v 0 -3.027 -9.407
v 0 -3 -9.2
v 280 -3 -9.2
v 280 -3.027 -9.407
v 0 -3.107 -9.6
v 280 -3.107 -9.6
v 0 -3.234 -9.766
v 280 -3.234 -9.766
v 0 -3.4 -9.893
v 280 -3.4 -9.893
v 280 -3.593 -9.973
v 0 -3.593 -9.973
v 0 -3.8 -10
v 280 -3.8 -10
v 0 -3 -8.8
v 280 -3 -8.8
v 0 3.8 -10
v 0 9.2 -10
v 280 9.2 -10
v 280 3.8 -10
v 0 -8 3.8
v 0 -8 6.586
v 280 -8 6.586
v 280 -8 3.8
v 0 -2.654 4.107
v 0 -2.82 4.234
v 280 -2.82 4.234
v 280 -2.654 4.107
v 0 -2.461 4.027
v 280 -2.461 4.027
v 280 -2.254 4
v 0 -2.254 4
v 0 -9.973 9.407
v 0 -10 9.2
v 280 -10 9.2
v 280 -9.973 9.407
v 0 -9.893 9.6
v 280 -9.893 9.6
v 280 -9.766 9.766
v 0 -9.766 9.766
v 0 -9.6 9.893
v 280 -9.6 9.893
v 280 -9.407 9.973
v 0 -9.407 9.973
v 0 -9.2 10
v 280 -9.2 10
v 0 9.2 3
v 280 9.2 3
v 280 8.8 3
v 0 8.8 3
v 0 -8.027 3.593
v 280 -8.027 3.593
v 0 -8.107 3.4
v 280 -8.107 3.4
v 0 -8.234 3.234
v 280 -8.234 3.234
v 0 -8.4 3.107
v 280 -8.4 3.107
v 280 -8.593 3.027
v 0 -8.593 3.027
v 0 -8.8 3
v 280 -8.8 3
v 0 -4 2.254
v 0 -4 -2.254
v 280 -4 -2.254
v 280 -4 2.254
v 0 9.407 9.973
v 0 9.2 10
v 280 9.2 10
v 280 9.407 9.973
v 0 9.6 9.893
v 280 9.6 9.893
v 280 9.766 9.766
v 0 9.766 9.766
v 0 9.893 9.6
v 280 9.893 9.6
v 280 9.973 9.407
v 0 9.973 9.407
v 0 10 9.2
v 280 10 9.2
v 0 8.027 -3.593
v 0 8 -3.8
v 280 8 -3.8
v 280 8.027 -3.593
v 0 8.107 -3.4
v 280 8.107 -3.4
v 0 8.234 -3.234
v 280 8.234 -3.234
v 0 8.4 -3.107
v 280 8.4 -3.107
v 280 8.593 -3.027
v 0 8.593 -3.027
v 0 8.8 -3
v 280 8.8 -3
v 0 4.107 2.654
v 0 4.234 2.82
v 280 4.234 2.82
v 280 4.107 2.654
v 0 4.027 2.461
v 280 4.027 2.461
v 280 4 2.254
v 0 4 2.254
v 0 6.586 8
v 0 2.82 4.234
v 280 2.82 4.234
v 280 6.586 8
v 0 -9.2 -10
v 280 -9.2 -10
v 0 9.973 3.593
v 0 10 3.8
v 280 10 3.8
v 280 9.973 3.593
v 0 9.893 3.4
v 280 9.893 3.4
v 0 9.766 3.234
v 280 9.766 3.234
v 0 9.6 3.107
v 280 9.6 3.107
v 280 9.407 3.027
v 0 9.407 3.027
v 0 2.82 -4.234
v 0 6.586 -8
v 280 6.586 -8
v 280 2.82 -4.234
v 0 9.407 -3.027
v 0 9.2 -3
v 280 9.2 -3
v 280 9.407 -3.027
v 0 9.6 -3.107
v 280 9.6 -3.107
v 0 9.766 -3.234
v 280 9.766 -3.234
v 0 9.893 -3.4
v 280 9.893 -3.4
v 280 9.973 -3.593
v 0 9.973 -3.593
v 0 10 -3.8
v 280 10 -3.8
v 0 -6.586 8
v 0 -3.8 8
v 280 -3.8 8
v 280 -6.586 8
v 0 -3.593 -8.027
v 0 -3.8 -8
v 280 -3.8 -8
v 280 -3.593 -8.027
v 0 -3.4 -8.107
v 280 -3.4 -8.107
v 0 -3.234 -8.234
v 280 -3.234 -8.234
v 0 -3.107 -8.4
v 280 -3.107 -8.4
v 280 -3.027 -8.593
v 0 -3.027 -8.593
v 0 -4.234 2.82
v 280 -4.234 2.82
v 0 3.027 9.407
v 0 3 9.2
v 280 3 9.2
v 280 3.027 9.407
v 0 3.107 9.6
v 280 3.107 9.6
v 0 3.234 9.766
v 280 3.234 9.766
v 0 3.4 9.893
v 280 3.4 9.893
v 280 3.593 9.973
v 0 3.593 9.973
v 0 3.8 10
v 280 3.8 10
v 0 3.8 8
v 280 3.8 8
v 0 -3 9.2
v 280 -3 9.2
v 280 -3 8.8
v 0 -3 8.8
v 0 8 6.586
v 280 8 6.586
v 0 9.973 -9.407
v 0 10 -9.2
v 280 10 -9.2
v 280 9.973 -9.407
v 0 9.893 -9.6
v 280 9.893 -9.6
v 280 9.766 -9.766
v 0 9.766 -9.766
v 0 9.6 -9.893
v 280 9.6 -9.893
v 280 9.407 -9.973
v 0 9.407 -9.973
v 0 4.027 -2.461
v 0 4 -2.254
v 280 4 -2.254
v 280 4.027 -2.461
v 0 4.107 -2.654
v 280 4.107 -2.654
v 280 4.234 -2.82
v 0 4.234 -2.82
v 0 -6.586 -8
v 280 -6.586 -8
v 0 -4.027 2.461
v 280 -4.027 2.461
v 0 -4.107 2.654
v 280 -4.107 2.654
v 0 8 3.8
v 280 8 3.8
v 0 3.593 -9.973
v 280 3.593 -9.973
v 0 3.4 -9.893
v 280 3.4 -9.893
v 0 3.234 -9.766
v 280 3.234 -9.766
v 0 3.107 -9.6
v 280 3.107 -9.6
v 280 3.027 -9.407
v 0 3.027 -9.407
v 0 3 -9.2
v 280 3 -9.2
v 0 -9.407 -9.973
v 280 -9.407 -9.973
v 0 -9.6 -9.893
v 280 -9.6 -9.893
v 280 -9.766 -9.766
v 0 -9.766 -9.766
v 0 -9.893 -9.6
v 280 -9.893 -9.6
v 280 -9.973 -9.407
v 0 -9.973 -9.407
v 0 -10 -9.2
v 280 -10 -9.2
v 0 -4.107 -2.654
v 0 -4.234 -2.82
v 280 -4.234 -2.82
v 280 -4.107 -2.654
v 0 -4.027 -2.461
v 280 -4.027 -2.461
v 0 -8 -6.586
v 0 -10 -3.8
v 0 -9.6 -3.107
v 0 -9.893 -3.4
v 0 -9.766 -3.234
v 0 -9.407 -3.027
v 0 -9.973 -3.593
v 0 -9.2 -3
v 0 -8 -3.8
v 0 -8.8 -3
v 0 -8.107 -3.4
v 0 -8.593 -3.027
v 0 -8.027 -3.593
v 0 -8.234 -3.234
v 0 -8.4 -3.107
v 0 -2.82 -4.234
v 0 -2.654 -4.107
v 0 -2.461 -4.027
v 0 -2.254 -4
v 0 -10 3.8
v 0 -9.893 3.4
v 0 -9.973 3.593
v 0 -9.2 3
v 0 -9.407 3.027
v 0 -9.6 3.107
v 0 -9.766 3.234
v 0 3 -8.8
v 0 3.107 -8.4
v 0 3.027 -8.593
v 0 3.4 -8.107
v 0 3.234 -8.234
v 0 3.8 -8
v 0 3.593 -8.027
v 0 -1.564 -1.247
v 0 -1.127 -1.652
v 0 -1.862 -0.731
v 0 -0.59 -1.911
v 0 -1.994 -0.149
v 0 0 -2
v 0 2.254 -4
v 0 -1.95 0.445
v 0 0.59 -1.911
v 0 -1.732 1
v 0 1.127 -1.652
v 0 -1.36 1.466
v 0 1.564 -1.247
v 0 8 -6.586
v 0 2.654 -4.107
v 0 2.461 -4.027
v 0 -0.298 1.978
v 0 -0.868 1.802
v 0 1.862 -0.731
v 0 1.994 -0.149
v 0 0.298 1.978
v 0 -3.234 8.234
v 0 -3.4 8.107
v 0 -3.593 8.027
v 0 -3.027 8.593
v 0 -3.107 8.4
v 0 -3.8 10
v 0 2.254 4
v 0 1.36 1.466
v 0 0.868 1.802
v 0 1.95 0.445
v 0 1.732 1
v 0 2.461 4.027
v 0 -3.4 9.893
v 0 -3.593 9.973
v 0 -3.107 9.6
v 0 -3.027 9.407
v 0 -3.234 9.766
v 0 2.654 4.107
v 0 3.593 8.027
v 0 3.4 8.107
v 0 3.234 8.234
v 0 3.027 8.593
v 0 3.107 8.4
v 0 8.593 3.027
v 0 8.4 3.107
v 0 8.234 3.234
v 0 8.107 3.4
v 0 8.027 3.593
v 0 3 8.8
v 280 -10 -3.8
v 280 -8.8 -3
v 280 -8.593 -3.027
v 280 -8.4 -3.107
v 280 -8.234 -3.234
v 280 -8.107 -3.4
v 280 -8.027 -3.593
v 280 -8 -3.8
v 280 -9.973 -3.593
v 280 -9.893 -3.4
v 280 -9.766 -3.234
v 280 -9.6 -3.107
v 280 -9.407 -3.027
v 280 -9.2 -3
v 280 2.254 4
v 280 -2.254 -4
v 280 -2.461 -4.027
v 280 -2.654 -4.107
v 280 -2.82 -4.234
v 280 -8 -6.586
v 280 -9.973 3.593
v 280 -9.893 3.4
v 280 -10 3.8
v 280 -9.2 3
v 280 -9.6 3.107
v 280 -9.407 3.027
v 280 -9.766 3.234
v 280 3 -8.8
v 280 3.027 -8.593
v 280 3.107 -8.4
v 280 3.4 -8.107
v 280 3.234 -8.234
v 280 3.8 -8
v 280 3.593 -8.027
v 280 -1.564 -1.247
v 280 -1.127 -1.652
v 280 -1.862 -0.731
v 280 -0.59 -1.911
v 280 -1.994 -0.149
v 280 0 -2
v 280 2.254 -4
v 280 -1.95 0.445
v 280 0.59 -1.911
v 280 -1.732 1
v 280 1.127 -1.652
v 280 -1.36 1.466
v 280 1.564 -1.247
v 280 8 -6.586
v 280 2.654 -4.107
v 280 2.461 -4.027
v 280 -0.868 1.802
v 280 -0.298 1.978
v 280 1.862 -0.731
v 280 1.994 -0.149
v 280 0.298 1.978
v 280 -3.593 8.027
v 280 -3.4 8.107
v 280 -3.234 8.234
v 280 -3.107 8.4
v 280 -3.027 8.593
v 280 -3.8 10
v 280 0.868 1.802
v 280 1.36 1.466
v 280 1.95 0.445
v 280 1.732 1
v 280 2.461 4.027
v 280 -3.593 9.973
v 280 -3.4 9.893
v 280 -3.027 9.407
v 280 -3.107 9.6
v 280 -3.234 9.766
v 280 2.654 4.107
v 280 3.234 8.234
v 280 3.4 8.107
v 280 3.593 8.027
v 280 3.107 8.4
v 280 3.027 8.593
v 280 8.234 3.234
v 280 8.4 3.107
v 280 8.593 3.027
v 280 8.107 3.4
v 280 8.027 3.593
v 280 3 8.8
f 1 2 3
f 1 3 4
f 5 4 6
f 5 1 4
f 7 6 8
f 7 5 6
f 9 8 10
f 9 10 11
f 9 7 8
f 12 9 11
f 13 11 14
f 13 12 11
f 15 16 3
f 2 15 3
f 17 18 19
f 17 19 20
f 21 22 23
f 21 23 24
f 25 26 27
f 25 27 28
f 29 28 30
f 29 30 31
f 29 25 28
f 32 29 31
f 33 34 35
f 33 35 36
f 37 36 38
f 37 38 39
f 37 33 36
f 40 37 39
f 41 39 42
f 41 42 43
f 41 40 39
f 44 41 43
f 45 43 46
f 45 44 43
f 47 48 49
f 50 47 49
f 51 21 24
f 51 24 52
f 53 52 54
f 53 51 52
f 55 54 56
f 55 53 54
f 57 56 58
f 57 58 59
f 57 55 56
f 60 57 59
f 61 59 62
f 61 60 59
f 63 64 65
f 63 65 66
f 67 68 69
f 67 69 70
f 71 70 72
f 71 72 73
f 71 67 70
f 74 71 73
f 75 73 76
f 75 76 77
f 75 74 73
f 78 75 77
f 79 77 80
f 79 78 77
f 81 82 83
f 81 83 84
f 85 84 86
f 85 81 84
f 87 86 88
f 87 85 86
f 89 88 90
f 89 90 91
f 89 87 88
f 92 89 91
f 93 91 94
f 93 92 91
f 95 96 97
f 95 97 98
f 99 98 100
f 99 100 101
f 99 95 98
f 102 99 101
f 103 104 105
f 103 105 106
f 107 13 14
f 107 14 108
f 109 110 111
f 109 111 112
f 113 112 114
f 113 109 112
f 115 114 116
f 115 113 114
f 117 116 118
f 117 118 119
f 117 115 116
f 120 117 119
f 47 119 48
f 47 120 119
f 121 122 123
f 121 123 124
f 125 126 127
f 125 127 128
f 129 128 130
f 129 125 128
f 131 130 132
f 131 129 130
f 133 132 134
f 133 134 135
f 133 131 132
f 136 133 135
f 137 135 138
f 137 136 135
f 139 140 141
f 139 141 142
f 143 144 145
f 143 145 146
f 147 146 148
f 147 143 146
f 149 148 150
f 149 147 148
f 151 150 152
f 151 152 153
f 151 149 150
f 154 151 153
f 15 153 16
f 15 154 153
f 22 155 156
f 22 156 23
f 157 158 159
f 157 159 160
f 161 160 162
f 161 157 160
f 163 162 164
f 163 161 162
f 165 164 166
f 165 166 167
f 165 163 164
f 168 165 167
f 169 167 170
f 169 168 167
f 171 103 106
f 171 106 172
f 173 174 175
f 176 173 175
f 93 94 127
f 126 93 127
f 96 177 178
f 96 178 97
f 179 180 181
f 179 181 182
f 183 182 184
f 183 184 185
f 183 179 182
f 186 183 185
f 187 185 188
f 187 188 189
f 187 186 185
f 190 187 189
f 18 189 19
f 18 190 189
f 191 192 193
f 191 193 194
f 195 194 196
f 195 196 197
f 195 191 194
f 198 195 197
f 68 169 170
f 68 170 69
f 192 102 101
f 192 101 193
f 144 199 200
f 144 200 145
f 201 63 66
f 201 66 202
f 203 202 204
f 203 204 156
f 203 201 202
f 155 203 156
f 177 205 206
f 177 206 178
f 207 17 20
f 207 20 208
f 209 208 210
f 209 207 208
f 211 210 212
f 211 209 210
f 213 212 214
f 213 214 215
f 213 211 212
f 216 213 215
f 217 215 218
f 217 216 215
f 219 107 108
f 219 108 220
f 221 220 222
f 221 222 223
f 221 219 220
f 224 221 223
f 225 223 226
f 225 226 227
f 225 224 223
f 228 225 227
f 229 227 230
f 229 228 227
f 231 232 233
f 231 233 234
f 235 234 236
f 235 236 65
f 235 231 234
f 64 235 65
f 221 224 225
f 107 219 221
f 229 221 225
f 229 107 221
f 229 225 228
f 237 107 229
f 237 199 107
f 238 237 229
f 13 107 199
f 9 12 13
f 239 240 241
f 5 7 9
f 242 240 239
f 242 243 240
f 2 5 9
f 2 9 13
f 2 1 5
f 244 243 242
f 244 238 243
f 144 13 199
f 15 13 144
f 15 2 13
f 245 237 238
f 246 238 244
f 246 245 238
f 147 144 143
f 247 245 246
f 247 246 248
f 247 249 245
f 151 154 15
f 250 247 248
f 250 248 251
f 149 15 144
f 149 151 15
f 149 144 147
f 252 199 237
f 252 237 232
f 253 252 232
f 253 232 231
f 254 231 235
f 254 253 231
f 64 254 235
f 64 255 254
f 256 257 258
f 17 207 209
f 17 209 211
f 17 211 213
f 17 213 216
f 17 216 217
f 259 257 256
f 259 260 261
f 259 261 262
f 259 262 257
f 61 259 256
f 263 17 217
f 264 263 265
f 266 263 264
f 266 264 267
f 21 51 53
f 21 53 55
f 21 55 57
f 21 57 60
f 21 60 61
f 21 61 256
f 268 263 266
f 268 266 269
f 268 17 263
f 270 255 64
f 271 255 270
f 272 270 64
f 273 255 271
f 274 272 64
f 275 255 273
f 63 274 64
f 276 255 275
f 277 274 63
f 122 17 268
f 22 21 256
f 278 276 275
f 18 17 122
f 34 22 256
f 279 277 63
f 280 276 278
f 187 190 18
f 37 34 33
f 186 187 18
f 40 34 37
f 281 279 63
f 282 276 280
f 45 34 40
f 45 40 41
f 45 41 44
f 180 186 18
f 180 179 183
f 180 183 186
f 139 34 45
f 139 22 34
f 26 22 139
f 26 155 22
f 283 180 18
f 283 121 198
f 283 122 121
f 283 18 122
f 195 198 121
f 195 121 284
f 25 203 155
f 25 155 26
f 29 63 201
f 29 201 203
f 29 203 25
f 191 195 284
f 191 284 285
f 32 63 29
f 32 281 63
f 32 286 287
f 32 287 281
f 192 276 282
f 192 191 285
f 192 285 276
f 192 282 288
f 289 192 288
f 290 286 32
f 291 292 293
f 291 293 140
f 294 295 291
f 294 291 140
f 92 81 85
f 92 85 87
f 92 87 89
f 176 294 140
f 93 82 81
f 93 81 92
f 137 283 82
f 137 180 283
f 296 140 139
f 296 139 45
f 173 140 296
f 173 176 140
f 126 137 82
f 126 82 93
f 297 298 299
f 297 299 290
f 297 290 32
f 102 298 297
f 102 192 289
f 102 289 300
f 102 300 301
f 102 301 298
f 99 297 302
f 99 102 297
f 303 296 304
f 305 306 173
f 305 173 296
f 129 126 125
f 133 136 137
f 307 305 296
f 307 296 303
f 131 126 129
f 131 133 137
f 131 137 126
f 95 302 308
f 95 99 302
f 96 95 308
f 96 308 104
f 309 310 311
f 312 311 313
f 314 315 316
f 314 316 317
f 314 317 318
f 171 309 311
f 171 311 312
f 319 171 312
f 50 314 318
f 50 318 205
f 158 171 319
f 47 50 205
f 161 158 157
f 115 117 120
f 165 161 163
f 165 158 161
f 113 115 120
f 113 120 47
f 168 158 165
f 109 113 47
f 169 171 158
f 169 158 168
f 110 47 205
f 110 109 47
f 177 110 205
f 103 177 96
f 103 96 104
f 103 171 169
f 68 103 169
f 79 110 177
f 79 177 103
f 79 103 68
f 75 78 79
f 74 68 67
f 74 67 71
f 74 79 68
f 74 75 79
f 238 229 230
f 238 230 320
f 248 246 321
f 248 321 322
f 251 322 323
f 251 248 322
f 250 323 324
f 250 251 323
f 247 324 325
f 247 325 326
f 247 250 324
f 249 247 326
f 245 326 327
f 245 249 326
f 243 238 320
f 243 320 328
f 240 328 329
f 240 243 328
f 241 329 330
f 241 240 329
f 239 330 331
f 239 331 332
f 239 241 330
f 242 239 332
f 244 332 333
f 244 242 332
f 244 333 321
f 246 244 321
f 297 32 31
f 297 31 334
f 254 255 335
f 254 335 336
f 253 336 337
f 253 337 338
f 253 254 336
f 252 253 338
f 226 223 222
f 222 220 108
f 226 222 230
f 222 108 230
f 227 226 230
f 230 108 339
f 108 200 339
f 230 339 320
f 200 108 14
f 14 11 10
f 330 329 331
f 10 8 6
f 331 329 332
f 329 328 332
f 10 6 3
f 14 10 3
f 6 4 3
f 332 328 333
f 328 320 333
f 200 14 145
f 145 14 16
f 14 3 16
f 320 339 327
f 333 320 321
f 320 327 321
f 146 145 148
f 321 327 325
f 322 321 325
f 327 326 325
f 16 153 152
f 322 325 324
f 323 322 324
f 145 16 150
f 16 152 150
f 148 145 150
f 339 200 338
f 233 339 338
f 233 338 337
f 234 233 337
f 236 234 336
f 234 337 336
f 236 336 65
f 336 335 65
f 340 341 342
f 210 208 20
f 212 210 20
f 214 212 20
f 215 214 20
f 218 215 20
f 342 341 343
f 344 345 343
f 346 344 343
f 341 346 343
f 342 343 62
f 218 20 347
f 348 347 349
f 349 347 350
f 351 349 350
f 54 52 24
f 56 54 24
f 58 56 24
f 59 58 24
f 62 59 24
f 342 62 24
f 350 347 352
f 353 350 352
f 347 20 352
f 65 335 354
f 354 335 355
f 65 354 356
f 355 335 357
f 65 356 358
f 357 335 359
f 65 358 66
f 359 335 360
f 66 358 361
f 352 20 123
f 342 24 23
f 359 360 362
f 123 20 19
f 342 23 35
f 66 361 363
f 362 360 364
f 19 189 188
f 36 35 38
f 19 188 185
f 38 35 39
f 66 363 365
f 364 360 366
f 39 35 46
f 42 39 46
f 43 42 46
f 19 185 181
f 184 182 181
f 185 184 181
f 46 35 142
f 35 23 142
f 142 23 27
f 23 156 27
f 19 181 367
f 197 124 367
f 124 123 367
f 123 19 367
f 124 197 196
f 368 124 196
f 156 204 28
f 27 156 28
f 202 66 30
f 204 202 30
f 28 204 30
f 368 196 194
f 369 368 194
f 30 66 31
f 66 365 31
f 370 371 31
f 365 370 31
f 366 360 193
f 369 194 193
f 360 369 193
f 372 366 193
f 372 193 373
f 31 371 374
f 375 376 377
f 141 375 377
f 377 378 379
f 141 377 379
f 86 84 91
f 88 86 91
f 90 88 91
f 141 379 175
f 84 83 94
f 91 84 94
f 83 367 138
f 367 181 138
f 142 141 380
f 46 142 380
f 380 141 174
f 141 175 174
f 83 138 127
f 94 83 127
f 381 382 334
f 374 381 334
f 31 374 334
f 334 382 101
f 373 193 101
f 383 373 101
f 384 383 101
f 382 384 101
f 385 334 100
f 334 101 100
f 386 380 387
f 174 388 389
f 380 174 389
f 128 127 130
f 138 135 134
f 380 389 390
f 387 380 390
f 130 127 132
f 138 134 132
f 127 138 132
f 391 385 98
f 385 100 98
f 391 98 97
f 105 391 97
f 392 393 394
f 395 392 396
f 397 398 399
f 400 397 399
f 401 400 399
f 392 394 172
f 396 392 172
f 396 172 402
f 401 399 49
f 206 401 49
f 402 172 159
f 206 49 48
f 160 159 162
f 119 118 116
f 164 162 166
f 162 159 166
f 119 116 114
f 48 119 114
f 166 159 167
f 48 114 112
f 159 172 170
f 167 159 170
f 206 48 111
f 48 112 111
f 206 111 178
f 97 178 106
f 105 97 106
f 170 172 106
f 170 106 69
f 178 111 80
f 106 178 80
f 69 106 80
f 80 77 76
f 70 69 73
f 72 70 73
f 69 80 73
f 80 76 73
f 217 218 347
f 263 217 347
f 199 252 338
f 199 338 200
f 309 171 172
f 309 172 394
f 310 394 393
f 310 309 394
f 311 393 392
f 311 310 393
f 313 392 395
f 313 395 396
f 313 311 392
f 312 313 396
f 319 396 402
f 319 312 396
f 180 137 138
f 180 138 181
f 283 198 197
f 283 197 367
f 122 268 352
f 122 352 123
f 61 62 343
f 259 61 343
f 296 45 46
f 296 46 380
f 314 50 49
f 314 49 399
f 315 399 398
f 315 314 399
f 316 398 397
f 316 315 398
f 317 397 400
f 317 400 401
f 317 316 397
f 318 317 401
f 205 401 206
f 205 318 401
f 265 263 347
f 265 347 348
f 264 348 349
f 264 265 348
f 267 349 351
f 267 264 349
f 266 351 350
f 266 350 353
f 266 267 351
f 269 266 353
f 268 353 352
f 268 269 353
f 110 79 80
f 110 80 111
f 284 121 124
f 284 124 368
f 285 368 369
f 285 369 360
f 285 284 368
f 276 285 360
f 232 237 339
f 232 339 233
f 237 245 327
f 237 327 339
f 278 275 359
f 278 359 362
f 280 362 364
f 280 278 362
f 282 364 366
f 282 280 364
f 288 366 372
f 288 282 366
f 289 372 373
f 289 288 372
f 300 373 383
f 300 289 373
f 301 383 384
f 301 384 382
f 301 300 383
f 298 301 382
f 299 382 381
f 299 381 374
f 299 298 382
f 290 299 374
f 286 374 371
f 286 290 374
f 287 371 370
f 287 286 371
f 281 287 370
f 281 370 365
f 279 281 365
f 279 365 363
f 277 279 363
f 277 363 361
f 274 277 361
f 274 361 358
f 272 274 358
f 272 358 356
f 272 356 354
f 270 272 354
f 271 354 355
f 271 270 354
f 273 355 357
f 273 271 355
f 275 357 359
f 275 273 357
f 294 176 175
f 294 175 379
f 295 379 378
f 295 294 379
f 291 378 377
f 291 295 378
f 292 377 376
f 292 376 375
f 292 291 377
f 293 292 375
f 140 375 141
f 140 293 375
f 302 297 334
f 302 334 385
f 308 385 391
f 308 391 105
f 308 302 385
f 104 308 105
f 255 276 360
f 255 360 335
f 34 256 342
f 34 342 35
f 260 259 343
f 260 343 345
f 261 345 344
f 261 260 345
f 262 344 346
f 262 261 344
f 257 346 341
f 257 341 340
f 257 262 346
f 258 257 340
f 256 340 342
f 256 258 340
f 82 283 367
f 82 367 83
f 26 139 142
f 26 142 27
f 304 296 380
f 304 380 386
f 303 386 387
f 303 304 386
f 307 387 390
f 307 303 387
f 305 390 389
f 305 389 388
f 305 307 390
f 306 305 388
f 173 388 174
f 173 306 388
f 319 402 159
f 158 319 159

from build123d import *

# Parameters (mm, degrees)
SKETCH11_R       = 2
SIZE_4X4_1_DEPTH = 280


with BuildPart() as part:
    # Sketch11 → Size 4X4 (1) (new body)
    with BuildSketch(Plane(origin=(0, 0, 0), x_dir=(0, 0, -1), z_dir=(1, 0, 0))):
        with BuildLine():
            Line((-3, 9.2), (-3, 8.8))
            ThreePointArc((-3, 8.8), (-3.234314575, 8.234314575), (-3.8, 8))
            Line((-3.8, 8), (-6.585786438, 8))
            Line((-6.585786438, 8), (-2.820101013, 4.234314575))
            ThreePointArc((-2.820101013, 4.234314575), (-2.560562334, 4.060896374), (-2.254415588, 4))
            Line((-2.254415588, 4), (2.254415588, 4))
            ThreePointArc((2.254415588, 4), (2.560562334, 4.060896374), (2.820101013, 4.234314575))
            Line((2.820101013, 4.234314575), (6.585786438, 8))
            Line((6.585786438, 8), (3.8, 8))
            ThreePointArc((3.8, 8), (3.234314575, 8.234314575), (3, 8.8))
            Line((3, 8.8), (3, 9.2))
            ThreePointArc((3, 9.2), (3.234314575, 9.765685425), (3.8, 10))
            Line((3.8, 10), (9.2, 10))
            ThreePointArc((9.2, 10), (9.765685425, 9.765685425), (10, 9.2))
            Line((10, 9.2), (10, 3.8))
            ThreePointArc((10, 3.8), (9.765685425, 3.234314575), (9.2, 3))
            Line((9.2, 3), (8.8, 3))
            ThreePointArc((8.8, 3), (8.234314575, 3.234314575), (8, 3.8))
            Line((8, 3.8), (8, 6.585786438))
            Line((8, 6.585786438), (4.234314575, 2.820101013))
            ThreePointArc((4.234314575, 2.820101013), (4.060896374, 2.560562334), (4, 2.254415588))
            Line((4, 2.254415588), (4, -2.254415588))
            ThreePointArc((4, -2.254415588), (4.060896374, -2.560562334), (4.234314575, -2.820101013))
            Line((4.234314575, -2.820101013), (8, -6.585786438))
            Line((8, -6.585786438), (8, -3.8))
            ThreePointArc((8, -3.8), (8.234314575, -3.234314575), (8.8, -3))
            Line((8.8, -3), (9.2, -3))
            ThreePointArc((9.2, -3), (9.765685425, -3.234314575), (10, -3.8))
            Line((10, -3.8), (10, -9.2))
            ThreePointArc((10, -9.2), (9.765685425, -9.765685425), (9.2, -10))
            Line((9.2, -10), (3.8, -10))
            ThreePointArc((3.8, -10), (3.234314575, -9.765685425), (3, -9.2))
            Line((3, -9.2), (3, -8.8))
            ThreePointArc((3, -8.8), (3.234314575, -8.234314575), (3.8, -8))
            Line((3.8, -8), (6.585786438, -8))
            Line((6.585786438, -8), (2.820101013, -4.234314575))
            ThreePointArc((2.820101013, -4.234314575), (2.560562334, -4.060896374), (2.254415588, -4))
            Line((2.254415588, -4), (-2.254415588, -4))
            ThreePointArc((-2.254415588, -4), (-2.560562334, -4.060896374), (-2.820101013, -4.234314575))
            Line((-2.820101013, -4.234314575), (-6.585786438, -8))
            Line((-6.585786438, -8), (-3.8, -8))
            ThreePointArc((-3.8, -8), (-3.234314575, -8.234314575), (-3, -8.8))
            Line((-3, -8.8), (-3, -9.2))
            ThreePointArc((-3, -9.2), (-3.234314575, -9.765685425), (-3.8, -10))
            Line((-3.8, -10), (-9.2, -10))
            ThreePointArc((-9.2, -10), (-9.765685425, -9.765685425), (-10, -9.2))
            Line((-10, -9.2), (-10, -3.8))
            ThreePointArc((-10, -3.8), (-9.765685425, -3.234314575), (-9.2, -3))
            Line((-9.2, -3), (-8.8, -3))
            ThreePointArc((-8.8, -3), (-8.234314575, -3.234314575), (-8, -3.8))
            Line((-8, -3.8), (-8, -6.585786438))
            Line((-8, -6.585786438), (-4.234314575, -2.820101013))
            ThreePointArc((-4.234314575, -2.820101013), (-4.060896374, -2.560562334), (-4, -2.254415588))
            Line((-4, -2.254415588), (-4, 2.254415588))
            ThreePointArc((-4, 2.254415588), (-4.060896374, 2.560562334), (-4.234314575, 2.820101013))
            Line((-4.234314575, 2.820101013), (-8, 6.585786438))
            Line((-8, 6.585786438), (-8, 3.8))
            ThreePointArc((-8, 3.8), (-8.234314575, 3.234314575), (-8.8, 3))
            Line((-8.8, 3), (-9.2, 3))
            ThreePointArc((-9.2, 3), (-9.765685425, 3.234314575), (-10, 3.8))
            Line((-10, 3.8), (-10, 9.2))
            ThreePointArc((-10, 9.2), (-9.765685425, 9.765685425), (-9.2, 10))
            Line((-9.2, 10), (-3.8, 10))
            ThreePointArc((-3.8, 10), (-3.234314575, 9.765685425), (-3, 9.2))
        make_face()
        Circle(SKETCH11_R, mode=Mode.SUBTRACT)
    extrude(amount=SIZE_4X4_1_DEPTH)


solid = part.part
